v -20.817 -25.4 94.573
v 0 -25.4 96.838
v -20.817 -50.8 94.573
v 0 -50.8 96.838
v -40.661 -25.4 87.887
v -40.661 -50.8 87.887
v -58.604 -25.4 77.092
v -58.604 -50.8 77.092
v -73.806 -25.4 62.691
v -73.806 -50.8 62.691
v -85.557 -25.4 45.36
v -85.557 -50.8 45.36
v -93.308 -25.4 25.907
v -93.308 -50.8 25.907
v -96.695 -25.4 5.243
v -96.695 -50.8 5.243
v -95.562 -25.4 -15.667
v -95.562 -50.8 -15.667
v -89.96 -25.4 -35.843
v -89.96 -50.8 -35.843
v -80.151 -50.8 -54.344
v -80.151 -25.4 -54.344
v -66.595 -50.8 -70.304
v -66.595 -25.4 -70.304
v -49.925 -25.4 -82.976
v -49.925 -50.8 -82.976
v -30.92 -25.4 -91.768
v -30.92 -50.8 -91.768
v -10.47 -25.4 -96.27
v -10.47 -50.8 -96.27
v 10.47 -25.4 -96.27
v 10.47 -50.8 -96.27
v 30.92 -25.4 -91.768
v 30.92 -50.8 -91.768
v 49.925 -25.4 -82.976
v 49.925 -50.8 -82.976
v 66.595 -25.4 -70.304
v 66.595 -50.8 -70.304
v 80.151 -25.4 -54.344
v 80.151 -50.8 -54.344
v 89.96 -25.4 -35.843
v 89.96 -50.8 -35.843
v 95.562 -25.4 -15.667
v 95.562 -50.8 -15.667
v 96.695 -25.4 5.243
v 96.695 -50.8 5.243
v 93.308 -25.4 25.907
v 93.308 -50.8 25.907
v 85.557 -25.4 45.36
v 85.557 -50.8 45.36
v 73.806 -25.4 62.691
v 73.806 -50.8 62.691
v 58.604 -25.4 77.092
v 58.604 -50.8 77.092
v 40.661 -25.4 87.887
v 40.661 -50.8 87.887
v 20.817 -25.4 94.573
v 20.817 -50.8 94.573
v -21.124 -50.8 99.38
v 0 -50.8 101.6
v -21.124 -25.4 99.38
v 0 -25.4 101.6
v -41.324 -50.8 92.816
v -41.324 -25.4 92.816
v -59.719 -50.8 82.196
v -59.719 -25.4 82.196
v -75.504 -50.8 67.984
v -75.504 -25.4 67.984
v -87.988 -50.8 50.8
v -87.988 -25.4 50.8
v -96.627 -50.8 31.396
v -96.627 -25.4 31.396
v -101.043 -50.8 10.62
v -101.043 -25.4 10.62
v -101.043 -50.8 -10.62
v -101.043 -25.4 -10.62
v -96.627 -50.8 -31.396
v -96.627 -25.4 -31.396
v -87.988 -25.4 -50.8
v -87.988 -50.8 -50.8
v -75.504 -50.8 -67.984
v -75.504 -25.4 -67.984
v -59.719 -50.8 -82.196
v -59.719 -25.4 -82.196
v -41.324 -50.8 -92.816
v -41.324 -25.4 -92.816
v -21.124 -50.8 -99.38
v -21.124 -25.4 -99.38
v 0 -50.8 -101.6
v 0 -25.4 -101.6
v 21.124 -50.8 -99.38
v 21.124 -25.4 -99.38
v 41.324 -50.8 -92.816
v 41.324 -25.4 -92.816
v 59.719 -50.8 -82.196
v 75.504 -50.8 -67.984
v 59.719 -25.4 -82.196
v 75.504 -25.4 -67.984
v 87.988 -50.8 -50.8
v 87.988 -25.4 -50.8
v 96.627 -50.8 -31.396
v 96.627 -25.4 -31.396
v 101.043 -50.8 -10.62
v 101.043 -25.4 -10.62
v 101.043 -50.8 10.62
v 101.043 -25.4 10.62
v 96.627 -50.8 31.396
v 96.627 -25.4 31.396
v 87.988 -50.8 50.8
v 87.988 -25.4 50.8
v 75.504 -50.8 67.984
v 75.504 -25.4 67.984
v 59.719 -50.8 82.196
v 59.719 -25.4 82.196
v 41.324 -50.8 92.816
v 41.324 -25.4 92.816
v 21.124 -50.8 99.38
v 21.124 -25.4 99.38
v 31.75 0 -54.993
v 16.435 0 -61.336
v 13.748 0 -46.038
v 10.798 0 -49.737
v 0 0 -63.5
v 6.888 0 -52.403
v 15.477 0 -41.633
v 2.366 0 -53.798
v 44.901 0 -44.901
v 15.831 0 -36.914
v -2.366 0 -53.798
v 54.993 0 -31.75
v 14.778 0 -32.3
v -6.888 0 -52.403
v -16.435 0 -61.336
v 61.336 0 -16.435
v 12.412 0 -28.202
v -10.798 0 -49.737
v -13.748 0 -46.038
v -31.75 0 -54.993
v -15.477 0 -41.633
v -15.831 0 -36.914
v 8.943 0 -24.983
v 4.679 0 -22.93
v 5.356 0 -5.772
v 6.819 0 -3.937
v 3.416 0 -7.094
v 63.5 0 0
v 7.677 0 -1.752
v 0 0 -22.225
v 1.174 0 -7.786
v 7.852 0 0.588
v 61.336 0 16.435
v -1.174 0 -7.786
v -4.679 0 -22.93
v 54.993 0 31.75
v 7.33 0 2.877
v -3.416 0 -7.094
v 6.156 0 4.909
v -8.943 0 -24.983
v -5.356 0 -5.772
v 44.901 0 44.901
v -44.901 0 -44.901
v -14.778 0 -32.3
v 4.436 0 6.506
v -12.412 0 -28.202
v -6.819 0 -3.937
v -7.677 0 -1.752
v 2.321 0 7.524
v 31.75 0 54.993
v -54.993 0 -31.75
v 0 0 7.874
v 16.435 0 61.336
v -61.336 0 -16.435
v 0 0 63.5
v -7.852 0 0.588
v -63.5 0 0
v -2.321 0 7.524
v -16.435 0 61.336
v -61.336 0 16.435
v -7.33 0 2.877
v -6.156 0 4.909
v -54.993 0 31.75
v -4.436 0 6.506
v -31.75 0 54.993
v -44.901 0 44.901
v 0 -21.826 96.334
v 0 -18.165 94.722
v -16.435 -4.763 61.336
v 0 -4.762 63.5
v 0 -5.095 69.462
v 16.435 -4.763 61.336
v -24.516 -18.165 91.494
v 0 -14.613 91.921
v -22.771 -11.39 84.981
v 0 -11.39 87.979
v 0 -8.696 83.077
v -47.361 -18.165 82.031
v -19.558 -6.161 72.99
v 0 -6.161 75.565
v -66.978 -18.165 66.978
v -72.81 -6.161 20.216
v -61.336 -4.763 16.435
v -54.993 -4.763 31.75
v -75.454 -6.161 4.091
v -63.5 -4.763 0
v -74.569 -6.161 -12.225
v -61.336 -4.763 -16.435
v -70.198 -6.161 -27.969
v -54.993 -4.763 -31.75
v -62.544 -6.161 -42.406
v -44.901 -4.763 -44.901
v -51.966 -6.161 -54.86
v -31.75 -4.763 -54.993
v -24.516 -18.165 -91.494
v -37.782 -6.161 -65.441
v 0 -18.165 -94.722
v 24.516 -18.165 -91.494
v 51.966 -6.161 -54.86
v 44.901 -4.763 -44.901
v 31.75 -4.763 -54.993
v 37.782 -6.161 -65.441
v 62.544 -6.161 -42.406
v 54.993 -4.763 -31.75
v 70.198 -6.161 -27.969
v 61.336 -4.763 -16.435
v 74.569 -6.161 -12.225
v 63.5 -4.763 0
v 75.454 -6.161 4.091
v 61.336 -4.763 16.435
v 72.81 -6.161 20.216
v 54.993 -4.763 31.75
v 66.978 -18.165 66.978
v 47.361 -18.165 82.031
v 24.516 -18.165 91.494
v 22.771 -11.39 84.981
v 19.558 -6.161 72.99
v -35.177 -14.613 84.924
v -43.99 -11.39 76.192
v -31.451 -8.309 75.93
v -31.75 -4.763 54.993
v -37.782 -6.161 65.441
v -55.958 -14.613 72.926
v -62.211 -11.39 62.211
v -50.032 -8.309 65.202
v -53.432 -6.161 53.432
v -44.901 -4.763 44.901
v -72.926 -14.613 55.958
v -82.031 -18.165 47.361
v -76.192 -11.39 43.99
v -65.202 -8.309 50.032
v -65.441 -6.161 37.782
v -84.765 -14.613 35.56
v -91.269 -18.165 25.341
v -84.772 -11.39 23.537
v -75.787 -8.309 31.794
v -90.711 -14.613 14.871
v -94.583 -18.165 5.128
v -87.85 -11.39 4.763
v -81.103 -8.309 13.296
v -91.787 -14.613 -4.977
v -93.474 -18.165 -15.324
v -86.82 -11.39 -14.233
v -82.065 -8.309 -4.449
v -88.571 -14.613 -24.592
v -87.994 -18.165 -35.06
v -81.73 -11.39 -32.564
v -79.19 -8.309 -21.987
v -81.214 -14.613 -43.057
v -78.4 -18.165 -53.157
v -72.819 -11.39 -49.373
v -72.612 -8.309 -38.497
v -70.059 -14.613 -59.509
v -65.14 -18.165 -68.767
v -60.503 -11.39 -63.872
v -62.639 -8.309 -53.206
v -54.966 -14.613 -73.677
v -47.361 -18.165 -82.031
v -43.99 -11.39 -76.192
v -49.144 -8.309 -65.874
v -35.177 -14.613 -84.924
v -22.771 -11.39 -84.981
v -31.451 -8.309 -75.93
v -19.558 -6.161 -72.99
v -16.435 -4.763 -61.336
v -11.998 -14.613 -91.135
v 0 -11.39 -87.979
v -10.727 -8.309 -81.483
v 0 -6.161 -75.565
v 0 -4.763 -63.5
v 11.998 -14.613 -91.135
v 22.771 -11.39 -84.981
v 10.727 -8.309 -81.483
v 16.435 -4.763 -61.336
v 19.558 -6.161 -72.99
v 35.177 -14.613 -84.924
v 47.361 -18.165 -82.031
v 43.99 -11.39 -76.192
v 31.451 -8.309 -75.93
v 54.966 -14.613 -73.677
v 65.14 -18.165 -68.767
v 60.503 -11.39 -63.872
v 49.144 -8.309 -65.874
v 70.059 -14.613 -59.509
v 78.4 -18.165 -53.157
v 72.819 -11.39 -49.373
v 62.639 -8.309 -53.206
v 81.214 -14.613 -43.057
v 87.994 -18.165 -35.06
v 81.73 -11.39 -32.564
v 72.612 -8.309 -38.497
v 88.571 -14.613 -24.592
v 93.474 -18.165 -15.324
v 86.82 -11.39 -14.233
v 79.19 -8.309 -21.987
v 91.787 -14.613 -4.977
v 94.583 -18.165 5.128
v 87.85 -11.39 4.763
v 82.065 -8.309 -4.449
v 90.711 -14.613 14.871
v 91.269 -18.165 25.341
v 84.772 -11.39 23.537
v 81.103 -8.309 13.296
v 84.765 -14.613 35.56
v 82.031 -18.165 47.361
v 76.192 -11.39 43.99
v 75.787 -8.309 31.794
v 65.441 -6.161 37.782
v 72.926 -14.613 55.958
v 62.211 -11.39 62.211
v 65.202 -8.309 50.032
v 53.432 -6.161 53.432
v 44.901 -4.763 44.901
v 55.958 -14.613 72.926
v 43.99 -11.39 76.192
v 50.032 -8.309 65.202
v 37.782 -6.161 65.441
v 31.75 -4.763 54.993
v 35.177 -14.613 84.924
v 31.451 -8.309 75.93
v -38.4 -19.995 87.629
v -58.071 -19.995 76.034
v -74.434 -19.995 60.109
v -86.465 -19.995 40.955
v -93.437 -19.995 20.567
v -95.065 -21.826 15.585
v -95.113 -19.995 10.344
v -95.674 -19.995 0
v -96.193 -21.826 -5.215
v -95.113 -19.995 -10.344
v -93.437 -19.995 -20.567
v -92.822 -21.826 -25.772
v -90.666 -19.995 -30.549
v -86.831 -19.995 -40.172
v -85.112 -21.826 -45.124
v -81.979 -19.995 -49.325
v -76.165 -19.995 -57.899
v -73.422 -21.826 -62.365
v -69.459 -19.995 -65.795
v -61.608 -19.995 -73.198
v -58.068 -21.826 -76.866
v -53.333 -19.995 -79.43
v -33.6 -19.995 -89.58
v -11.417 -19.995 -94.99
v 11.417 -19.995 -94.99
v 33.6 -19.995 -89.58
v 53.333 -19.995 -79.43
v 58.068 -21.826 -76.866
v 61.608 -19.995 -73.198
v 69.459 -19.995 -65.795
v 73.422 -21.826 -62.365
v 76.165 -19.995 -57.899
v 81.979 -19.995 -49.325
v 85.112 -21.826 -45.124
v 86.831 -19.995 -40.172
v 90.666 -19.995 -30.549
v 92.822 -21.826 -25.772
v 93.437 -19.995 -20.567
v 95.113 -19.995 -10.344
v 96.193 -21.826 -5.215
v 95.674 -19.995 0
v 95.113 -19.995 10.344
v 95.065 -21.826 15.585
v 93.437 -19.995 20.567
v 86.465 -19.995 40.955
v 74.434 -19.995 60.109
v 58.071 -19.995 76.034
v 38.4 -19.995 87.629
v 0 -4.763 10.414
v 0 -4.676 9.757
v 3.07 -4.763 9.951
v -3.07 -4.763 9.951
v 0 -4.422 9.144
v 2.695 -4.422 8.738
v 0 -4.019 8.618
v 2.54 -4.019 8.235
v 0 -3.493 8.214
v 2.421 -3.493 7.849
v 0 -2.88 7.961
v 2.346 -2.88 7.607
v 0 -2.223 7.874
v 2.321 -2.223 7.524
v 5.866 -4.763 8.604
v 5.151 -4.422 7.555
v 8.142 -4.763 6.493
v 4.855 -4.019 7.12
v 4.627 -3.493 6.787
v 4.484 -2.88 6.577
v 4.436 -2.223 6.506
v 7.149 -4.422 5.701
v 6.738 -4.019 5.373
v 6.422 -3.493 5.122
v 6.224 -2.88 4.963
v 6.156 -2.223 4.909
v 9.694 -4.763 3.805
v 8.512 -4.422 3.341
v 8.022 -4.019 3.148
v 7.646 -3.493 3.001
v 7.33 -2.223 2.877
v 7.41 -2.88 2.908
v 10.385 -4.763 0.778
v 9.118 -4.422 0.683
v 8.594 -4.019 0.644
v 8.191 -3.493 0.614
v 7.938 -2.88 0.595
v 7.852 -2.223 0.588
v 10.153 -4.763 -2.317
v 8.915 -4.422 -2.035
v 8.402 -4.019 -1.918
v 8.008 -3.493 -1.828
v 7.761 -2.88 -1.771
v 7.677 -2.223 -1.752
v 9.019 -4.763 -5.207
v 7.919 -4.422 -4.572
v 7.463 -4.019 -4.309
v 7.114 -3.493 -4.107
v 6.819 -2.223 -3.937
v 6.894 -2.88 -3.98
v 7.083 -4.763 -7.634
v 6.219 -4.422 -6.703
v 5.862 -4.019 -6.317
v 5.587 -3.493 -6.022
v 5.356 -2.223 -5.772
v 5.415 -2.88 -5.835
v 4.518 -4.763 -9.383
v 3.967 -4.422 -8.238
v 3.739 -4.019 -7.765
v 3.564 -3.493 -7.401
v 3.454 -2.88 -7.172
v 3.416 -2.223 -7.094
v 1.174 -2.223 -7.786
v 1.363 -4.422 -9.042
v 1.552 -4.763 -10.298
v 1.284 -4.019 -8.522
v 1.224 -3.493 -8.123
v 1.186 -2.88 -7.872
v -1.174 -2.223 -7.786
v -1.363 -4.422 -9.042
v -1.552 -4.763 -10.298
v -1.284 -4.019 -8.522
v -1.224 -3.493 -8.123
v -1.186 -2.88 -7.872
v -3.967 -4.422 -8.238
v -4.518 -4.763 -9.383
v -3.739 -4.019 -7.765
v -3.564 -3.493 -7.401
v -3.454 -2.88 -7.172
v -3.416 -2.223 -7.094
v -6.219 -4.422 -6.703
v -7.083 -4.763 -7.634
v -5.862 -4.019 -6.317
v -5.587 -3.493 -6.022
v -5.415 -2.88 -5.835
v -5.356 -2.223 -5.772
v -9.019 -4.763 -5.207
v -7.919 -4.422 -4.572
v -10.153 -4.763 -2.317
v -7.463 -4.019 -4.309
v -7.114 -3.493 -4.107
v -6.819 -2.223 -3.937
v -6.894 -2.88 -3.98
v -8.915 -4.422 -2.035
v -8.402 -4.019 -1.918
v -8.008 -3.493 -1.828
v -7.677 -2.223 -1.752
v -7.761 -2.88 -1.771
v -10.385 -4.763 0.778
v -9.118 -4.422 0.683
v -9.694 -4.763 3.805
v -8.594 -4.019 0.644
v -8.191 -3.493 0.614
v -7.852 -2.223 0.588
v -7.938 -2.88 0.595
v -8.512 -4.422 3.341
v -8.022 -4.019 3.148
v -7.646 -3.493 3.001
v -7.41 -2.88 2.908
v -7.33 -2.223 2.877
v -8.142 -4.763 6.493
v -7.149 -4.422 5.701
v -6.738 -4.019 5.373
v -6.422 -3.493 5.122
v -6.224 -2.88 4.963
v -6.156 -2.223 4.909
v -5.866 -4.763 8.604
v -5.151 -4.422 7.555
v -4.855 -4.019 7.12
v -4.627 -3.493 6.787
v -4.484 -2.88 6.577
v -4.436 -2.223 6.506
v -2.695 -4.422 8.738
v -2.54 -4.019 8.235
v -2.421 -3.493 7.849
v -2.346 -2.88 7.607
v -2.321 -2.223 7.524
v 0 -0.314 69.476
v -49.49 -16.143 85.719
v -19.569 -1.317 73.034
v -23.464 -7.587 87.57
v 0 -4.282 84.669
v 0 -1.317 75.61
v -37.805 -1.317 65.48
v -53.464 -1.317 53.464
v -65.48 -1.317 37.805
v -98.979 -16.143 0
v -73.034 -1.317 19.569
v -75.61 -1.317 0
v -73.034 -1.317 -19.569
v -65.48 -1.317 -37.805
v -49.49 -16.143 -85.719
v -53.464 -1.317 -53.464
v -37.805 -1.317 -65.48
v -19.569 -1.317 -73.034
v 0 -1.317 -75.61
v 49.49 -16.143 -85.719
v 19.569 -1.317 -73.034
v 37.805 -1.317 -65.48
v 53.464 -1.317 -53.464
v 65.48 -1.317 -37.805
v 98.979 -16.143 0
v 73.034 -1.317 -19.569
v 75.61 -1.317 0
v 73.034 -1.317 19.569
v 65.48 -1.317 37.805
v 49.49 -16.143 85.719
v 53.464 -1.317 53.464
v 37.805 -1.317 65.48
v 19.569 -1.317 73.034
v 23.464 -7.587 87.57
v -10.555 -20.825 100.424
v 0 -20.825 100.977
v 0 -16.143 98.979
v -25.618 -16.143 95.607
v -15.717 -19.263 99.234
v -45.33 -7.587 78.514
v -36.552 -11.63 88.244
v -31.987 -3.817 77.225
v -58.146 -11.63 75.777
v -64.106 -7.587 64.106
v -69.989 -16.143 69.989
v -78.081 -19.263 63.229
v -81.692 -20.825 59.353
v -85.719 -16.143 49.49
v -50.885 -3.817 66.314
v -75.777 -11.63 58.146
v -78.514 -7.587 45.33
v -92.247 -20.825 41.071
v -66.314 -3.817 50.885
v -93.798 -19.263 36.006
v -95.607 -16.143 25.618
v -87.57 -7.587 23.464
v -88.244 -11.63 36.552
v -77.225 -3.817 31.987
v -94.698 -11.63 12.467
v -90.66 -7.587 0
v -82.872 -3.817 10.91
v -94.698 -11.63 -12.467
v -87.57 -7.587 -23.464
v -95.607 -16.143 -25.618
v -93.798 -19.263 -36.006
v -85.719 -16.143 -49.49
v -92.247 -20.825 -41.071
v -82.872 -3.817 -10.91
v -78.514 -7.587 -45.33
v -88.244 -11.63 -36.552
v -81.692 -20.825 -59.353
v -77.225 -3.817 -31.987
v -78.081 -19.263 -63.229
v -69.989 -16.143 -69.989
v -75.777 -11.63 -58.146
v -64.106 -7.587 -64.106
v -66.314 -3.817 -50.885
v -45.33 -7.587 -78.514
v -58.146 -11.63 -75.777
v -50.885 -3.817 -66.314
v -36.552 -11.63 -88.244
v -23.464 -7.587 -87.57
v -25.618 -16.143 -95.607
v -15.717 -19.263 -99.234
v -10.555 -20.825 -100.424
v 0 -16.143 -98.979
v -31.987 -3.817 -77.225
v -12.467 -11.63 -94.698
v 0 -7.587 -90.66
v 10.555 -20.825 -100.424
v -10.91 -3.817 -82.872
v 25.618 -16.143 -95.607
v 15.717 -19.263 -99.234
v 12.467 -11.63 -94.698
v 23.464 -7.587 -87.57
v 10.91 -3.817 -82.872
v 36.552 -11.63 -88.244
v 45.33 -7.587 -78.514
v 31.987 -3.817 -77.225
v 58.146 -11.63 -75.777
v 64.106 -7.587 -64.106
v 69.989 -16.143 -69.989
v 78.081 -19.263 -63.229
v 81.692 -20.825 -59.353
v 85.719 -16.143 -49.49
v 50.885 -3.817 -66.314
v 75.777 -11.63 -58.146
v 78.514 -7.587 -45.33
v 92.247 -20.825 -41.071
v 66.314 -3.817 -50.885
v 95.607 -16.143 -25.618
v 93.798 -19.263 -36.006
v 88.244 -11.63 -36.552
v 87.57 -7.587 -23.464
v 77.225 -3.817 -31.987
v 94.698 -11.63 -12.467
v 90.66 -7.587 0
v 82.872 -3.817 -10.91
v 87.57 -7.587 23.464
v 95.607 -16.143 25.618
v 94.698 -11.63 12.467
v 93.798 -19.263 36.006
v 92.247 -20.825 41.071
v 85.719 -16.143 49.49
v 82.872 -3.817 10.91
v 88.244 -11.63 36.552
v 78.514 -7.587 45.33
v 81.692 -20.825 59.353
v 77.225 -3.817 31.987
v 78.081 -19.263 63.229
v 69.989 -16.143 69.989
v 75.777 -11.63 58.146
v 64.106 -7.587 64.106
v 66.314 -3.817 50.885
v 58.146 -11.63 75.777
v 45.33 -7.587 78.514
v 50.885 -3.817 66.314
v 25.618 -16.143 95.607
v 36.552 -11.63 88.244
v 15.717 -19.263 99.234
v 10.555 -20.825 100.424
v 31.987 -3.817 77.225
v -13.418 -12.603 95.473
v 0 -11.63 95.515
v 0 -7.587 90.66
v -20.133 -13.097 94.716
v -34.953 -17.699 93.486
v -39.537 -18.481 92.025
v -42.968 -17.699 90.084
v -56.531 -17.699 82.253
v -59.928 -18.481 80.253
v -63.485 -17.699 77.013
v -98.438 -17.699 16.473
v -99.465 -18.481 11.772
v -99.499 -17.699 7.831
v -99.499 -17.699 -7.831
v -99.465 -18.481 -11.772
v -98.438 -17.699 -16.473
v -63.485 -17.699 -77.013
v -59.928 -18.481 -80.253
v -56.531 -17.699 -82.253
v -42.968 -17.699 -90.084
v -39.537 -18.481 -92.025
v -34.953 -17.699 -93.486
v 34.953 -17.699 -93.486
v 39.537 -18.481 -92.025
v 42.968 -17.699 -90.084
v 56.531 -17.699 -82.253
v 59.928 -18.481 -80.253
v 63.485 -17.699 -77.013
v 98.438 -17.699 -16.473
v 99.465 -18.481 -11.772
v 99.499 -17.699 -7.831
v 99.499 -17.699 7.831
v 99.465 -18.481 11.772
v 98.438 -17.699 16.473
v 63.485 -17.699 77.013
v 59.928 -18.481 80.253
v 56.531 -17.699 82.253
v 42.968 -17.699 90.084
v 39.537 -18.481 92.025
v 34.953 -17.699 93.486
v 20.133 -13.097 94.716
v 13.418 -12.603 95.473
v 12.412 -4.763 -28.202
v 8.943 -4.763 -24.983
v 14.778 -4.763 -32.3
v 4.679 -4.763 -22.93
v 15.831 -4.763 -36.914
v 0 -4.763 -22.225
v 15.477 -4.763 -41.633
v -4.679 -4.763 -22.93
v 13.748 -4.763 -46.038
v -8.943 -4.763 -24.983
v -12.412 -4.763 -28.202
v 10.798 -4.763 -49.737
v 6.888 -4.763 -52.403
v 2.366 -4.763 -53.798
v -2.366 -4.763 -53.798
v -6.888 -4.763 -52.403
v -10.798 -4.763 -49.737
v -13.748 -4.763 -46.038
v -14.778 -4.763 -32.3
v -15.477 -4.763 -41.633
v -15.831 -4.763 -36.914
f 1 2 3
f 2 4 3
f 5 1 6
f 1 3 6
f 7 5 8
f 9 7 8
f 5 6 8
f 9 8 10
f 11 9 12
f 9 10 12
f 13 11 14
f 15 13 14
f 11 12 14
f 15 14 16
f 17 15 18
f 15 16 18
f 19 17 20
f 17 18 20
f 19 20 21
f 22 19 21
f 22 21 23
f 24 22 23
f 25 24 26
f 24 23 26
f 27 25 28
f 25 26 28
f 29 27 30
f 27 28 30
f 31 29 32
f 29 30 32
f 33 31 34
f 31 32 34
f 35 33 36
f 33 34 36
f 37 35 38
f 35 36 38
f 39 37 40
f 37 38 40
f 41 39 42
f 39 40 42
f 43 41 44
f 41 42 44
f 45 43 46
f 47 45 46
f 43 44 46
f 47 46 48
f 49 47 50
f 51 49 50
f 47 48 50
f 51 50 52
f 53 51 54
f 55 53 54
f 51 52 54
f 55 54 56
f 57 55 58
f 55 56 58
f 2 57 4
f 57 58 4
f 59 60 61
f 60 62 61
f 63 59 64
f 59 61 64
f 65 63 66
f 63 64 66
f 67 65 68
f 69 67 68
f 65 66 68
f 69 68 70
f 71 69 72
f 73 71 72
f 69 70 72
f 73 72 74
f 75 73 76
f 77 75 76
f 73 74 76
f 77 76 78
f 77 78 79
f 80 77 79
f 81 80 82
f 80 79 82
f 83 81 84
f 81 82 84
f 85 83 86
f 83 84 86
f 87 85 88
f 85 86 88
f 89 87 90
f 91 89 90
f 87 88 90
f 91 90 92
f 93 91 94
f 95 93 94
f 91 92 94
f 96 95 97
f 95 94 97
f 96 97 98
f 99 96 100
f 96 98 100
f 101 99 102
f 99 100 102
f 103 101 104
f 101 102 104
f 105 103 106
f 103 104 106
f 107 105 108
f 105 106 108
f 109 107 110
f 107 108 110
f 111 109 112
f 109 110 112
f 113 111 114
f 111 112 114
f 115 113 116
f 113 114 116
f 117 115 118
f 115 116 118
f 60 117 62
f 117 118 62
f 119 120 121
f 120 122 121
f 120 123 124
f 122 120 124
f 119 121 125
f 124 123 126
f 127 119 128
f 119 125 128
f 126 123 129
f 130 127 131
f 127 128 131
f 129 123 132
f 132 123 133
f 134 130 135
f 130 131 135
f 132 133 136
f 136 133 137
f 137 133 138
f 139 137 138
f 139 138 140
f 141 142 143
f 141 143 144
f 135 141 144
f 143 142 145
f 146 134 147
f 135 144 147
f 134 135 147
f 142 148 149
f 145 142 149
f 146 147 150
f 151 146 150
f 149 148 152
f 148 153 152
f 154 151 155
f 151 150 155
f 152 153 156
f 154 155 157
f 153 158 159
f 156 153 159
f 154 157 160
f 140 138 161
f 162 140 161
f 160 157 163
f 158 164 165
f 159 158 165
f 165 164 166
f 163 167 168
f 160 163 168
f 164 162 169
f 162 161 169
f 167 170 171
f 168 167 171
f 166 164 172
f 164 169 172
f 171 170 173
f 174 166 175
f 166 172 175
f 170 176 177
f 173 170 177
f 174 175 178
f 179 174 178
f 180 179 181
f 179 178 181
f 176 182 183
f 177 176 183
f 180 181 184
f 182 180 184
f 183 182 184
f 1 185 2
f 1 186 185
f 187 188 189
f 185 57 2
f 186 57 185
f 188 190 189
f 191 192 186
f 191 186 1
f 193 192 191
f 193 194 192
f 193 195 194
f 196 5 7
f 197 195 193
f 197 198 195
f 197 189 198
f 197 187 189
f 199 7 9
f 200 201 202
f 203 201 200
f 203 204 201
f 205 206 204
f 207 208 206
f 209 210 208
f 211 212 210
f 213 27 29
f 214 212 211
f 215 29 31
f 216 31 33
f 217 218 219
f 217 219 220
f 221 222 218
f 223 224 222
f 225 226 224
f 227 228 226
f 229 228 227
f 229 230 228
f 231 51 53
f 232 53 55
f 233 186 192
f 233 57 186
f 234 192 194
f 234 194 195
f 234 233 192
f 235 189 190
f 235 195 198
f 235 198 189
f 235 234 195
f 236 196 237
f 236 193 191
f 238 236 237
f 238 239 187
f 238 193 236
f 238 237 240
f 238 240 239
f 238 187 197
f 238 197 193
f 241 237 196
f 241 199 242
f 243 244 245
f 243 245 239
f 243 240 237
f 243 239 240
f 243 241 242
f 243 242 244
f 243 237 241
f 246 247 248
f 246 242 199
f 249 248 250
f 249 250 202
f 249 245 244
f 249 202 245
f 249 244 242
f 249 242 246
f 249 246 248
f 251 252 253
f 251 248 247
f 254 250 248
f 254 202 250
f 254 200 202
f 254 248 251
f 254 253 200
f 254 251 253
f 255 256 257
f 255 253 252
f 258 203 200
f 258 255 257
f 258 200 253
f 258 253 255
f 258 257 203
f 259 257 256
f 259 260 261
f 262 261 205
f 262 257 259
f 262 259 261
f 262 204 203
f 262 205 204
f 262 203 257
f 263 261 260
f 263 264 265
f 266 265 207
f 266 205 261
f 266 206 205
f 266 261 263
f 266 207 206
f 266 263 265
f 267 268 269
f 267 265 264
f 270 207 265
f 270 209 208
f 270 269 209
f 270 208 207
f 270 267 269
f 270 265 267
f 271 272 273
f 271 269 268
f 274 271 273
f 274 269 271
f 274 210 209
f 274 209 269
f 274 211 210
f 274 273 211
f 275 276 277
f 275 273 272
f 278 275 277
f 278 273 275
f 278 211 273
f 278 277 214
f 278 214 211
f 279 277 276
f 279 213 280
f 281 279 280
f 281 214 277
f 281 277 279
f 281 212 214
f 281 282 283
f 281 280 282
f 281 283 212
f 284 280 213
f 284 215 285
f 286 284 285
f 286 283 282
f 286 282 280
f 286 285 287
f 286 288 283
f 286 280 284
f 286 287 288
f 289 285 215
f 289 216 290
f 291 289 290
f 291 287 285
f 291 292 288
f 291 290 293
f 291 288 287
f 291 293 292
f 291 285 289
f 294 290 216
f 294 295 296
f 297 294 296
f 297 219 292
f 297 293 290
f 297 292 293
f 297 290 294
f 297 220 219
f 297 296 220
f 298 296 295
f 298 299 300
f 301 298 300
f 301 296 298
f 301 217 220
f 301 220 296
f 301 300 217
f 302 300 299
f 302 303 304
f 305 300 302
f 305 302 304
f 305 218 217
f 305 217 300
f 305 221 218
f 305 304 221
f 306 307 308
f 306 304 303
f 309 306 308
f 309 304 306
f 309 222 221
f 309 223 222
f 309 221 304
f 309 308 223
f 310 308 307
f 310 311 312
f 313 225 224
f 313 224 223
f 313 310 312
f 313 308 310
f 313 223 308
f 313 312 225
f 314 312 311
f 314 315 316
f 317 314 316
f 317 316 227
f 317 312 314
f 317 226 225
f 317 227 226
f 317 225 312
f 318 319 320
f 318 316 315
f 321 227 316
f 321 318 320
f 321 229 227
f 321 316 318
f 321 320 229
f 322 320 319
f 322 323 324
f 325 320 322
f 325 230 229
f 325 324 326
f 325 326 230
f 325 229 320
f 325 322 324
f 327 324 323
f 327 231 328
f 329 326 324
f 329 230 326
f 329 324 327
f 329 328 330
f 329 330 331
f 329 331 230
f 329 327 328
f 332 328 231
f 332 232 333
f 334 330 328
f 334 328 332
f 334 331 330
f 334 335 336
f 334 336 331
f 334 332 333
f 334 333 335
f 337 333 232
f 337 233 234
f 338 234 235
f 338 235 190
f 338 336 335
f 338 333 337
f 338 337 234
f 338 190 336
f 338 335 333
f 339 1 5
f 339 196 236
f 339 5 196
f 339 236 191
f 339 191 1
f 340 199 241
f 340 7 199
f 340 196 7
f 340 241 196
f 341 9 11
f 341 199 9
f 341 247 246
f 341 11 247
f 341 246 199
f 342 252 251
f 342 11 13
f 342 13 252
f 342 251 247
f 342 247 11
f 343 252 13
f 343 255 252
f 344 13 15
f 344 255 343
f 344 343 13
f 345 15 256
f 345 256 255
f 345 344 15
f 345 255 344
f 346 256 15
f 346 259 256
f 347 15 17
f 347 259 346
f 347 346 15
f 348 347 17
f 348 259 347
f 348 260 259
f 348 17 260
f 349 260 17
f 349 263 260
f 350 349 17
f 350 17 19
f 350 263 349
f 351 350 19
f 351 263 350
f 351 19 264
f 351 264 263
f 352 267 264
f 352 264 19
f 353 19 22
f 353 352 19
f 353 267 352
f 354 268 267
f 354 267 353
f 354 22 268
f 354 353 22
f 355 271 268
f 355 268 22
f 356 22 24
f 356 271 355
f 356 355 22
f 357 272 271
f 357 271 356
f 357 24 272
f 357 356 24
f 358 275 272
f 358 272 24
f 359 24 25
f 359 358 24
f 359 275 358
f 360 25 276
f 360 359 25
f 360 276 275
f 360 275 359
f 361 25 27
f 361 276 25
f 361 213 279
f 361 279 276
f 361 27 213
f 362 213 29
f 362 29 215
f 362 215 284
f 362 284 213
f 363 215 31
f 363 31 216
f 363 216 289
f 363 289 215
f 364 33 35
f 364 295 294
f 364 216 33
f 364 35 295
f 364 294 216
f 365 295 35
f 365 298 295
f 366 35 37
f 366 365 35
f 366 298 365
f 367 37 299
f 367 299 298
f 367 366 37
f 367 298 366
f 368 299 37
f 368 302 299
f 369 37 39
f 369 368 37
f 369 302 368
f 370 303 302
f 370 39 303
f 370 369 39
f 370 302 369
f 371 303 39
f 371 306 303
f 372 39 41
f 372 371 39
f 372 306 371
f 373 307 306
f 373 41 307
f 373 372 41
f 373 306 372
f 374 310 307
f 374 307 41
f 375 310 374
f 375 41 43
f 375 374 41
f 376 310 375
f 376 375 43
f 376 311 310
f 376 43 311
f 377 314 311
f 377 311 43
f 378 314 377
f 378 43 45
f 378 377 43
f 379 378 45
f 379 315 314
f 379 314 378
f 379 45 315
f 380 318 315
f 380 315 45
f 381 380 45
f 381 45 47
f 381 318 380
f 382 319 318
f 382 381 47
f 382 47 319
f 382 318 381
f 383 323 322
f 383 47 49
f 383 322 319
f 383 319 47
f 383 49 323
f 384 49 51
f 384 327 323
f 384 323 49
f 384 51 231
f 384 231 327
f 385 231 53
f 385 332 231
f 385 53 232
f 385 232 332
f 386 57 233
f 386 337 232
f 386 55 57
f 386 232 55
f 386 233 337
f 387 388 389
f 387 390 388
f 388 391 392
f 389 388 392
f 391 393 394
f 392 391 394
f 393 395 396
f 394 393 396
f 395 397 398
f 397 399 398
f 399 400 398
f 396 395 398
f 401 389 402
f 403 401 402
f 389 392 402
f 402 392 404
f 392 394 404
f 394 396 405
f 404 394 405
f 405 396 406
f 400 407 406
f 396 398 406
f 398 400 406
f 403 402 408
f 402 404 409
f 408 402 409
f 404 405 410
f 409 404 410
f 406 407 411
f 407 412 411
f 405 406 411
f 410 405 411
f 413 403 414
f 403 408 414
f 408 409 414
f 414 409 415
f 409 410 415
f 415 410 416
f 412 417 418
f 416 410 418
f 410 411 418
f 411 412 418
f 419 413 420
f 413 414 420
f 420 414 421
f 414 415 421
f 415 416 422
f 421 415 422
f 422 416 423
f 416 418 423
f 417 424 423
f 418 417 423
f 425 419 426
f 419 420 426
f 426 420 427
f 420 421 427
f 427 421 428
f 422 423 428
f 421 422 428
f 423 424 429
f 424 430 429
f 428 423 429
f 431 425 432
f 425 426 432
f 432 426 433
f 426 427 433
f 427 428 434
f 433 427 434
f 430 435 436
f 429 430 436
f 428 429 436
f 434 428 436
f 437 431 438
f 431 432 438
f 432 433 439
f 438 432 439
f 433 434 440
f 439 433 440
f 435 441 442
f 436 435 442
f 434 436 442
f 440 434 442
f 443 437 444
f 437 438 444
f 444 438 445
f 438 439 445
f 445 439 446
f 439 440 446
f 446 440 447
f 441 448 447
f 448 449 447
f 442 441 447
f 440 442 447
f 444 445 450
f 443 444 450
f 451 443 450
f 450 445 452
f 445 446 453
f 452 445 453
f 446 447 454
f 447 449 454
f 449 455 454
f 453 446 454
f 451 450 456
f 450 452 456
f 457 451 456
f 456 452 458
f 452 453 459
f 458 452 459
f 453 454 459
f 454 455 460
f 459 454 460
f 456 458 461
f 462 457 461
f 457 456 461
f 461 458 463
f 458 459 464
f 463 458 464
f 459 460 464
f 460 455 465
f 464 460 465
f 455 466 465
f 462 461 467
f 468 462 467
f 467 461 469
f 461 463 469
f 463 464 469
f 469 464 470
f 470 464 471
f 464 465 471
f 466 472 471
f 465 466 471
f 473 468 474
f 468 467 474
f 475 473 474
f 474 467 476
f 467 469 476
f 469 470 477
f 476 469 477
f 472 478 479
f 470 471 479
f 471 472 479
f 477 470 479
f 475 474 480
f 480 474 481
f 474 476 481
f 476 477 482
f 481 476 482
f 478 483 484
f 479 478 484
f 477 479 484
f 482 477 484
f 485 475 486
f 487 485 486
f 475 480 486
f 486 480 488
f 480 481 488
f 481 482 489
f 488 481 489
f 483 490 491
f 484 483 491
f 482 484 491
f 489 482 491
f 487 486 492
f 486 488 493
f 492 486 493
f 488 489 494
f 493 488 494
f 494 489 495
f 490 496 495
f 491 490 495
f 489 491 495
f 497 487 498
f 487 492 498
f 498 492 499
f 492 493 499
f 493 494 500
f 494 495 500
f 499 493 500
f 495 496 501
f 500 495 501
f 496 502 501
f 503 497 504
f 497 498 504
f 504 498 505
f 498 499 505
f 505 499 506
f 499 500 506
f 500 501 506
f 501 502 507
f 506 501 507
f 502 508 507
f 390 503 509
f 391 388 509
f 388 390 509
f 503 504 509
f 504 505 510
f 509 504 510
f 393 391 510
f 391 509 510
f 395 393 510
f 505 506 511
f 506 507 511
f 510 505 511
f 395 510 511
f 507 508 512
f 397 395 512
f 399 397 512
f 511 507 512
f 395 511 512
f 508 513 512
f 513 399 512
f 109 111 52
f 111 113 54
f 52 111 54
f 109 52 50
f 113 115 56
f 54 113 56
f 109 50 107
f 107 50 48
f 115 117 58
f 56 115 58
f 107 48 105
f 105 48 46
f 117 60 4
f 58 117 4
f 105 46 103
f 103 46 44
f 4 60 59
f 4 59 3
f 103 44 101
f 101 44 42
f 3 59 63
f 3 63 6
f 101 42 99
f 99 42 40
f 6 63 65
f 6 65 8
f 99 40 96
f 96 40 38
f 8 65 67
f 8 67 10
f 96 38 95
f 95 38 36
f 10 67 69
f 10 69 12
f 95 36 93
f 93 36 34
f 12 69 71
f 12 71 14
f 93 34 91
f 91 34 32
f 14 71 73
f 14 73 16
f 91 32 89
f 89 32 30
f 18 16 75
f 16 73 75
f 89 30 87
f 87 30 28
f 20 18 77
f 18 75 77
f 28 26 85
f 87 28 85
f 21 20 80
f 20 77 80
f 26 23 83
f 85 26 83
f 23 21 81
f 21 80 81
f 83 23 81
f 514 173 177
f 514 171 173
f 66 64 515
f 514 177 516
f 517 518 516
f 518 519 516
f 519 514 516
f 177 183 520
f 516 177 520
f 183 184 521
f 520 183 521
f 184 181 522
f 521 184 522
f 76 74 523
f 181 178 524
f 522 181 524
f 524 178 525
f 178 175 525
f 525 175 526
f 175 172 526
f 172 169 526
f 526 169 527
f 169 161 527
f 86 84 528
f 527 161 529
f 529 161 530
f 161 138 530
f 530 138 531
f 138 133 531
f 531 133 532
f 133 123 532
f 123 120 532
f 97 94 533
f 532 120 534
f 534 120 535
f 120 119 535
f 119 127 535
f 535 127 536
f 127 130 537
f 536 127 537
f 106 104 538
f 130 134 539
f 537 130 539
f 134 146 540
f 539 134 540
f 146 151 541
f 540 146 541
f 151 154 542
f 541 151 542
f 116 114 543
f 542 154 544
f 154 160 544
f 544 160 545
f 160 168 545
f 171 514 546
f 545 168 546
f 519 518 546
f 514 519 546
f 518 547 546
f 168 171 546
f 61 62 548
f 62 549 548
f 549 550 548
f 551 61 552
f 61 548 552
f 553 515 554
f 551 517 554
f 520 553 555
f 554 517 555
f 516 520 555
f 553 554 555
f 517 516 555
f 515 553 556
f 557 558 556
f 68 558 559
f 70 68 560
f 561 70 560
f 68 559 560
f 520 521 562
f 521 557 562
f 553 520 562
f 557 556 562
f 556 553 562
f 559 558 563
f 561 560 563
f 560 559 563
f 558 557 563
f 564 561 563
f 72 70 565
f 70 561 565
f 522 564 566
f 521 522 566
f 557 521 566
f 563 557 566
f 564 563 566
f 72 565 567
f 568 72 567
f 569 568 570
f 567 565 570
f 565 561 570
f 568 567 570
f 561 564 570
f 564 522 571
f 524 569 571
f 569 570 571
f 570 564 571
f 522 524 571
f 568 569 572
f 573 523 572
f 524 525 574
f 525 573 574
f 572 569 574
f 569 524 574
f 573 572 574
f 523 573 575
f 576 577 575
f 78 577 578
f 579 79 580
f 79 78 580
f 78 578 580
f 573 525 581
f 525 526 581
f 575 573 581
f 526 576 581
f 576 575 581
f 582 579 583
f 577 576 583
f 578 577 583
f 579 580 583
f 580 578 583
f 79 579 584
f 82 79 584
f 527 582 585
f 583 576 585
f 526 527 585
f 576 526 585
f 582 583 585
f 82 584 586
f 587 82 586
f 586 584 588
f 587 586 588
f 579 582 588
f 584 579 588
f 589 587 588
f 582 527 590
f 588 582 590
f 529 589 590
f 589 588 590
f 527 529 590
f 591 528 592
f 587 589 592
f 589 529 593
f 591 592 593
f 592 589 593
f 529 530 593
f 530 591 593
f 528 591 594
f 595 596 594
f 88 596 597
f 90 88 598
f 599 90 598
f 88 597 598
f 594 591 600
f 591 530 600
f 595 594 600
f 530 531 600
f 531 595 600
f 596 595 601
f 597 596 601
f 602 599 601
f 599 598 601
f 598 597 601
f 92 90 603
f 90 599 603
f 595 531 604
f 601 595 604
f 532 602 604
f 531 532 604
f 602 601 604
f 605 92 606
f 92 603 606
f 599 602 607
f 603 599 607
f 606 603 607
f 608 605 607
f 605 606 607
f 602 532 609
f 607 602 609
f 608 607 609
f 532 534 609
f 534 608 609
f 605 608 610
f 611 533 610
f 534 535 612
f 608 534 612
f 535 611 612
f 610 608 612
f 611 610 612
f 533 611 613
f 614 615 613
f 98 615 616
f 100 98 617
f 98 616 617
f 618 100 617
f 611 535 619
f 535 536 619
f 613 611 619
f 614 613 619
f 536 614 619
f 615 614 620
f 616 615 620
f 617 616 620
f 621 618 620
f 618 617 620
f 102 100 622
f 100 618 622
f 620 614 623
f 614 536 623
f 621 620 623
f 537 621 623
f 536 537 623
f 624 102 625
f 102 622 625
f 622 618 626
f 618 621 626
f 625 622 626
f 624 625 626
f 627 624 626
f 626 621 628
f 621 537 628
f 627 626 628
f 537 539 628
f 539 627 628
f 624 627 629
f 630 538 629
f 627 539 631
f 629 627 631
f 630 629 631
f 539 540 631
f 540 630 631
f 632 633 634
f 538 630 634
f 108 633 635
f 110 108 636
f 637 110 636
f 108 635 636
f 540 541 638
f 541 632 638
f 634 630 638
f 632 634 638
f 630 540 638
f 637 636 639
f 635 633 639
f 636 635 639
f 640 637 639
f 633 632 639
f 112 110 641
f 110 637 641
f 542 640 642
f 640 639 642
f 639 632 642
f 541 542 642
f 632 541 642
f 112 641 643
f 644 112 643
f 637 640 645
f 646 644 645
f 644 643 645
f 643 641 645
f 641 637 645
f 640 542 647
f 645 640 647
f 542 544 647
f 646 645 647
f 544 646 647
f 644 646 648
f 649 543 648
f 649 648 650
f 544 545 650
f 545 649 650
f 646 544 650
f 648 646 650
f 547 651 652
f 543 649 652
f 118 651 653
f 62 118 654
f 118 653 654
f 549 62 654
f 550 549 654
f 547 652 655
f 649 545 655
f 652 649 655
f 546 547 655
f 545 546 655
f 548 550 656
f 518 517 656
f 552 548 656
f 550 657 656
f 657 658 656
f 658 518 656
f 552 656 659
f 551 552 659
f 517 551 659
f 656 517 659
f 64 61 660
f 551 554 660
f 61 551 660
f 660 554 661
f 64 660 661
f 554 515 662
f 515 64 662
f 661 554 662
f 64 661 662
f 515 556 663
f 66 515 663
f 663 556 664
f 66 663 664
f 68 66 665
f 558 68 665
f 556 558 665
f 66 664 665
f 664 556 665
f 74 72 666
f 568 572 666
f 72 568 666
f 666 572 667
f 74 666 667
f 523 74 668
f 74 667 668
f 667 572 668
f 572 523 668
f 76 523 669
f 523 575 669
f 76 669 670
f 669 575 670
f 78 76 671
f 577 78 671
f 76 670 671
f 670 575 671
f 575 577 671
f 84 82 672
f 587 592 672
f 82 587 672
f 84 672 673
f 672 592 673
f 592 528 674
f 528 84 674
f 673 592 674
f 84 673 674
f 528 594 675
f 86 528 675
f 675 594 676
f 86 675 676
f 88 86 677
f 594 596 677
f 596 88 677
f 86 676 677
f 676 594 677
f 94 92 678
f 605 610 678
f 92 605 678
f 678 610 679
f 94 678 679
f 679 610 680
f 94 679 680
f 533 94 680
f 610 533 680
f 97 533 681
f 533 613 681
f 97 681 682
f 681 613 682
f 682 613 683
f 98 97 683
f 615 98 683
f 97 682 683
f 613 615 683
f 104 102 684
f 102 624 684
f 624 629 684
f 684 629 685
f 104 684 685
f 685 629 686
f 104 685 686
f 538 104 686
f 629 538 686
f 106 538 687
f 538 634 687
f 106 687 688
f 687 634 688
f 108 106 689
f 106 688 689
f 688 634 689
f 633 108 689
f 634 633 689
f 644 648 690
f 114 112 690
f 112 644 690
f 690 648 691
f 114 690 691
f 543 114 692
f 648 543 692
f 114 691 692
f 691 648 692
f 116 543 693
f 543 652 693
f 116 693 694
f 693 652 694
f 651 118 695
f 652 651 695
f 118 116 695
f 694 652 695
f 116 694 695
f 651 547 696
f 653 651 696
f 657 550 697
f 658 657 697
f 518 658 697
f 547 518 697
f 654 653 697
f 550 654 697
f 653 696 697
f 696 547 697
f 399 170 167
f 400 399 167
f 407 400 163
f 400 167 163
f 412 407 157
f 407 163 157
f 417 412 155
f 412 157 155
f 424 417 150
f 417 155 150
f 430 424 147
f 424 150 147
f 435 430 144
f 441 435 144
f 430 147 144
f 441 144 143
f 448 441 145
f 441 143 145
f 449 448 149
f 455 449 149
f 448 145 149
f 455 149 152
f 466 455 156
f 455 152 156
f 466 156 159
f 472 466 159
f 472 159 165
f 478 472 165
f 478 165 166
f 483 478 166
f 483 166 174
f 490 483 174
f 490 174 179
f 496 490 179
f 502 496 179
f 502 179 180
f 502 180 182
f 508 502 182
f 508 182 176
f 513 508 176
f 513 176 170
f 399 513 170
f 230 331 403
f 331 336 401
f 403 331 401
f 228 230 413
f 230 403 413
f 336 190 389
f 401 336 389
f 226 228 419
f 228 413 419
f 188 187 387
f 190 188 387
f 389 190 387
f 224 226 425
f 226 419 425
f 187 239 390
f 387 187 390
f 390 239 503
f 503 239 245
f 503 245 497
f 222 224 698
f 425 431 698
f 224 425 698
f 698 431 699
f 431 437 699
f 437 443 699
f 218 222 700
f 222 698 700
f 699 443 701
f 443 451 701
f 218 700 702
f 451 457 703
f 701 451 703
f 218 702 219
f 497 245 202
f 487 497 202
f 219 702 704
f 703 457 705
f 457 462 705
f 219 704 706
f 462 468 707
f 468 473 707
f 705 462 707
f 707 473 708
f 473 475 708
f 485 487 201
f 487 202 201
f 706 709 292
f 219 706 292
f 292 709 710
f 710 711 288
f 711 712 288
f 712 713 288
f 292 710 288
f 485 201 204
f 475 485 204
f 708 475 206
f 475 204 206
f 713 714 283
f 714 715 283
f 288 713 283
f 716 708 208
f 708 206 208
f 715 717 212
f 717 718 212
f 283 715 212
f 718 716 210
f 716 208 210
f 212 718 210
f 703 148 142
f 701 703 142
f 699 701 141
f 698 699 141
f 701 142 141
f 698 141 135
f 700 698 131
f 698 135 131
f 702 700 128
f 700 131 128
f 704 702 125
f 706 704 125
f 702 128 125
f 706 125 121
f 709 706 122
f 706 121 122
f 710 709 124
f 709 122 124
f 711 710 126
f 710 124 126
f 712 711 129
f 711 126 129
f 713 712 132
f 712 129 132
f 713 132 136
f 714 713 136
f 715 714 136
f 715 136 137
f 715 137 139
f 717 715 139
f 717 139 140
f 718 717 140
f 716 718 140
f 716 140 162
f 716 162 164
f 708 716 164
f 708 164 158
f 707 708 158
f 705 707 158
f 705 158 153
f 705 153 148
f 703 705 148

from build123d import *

# Parameters (mm, degrees)
SKETCH2_R          = 15.875
SKETCH2_R_2        = 7.874
CUT_EXTRUDE1_DEPTH = 25.4
FILLET1_R          = 2.54


with BuildPart() as part:
    # Sketch1 → Revolve1 (revolve)
    with BuildSketch(Plane.XY, mode=Mode.PRIVATE) as revolve1_sk:
        with BuildLine():
            Line((0, 0), (0, -4.7625))
            Line((0, -4.7625), (63.5, -4.7625))
            add(Edge.make_bspline(
                [(96.8375, -25.4), (96.8375, -4.7625), (63.5, -4.7625)],
                knots=[0, 0, 0, 1.570796327, 1.570796327, 1.570796327], degree=2, weights=[1, 0.707106781, 1]))
            Line((96.8375, -25.4), (96.8375, -50.8))
            Line((96.8375, -50.8), (101.6, -50.8))
            Line((101.6, -50.8), (101.6, -25.4))
            add(Edge.make_bspline(
                [(101.6, -25.4), (101.6, 0), (63.5, 0)],
                knots=[3.141592654, 3.141592654, 3.141592654, 4.71238898, 4.71238898, 4.71238898], degree=2, weights=[1, 0.707106781, 1]))
            Line((63.5, 0), (0, 0))
        make_face()
    revolve(revolve1_sk.sketch.rotate(Axis((0, 29.511089747, 0), (0, -1, 0)), 90), axis=Axis((0, 29.511089747, 0), (0, -1, 0)))

    # Sketch2 → Cut-Extrude1 (cut)
    with BuildSketch(Plane(origin=(0, 0, 0), x_dir=(1, 0, 0), z_dir=(0, 1, 0))):
        with Locations(Location((0, 38.1, 0), (0, 0, 270))):
            Circle(SKETCH2_R)
        with Locations(Location((0, 0, 0), (0, 0, 270))):
            Circle(SKETCH2_R_2)
    extrude(amount=-CUT_EXTRUDE1_DEPTH, mode=Mode.SUBTRACT)

    # Fillet1
    fillet1_edges = [part.edges().sort_by_distance(p)[0] for p in [
        (0, -4.7625, -7.874),
    ]]
    fillet(fillet1_edges, radius=FILLET1_R)


solid = part.part
